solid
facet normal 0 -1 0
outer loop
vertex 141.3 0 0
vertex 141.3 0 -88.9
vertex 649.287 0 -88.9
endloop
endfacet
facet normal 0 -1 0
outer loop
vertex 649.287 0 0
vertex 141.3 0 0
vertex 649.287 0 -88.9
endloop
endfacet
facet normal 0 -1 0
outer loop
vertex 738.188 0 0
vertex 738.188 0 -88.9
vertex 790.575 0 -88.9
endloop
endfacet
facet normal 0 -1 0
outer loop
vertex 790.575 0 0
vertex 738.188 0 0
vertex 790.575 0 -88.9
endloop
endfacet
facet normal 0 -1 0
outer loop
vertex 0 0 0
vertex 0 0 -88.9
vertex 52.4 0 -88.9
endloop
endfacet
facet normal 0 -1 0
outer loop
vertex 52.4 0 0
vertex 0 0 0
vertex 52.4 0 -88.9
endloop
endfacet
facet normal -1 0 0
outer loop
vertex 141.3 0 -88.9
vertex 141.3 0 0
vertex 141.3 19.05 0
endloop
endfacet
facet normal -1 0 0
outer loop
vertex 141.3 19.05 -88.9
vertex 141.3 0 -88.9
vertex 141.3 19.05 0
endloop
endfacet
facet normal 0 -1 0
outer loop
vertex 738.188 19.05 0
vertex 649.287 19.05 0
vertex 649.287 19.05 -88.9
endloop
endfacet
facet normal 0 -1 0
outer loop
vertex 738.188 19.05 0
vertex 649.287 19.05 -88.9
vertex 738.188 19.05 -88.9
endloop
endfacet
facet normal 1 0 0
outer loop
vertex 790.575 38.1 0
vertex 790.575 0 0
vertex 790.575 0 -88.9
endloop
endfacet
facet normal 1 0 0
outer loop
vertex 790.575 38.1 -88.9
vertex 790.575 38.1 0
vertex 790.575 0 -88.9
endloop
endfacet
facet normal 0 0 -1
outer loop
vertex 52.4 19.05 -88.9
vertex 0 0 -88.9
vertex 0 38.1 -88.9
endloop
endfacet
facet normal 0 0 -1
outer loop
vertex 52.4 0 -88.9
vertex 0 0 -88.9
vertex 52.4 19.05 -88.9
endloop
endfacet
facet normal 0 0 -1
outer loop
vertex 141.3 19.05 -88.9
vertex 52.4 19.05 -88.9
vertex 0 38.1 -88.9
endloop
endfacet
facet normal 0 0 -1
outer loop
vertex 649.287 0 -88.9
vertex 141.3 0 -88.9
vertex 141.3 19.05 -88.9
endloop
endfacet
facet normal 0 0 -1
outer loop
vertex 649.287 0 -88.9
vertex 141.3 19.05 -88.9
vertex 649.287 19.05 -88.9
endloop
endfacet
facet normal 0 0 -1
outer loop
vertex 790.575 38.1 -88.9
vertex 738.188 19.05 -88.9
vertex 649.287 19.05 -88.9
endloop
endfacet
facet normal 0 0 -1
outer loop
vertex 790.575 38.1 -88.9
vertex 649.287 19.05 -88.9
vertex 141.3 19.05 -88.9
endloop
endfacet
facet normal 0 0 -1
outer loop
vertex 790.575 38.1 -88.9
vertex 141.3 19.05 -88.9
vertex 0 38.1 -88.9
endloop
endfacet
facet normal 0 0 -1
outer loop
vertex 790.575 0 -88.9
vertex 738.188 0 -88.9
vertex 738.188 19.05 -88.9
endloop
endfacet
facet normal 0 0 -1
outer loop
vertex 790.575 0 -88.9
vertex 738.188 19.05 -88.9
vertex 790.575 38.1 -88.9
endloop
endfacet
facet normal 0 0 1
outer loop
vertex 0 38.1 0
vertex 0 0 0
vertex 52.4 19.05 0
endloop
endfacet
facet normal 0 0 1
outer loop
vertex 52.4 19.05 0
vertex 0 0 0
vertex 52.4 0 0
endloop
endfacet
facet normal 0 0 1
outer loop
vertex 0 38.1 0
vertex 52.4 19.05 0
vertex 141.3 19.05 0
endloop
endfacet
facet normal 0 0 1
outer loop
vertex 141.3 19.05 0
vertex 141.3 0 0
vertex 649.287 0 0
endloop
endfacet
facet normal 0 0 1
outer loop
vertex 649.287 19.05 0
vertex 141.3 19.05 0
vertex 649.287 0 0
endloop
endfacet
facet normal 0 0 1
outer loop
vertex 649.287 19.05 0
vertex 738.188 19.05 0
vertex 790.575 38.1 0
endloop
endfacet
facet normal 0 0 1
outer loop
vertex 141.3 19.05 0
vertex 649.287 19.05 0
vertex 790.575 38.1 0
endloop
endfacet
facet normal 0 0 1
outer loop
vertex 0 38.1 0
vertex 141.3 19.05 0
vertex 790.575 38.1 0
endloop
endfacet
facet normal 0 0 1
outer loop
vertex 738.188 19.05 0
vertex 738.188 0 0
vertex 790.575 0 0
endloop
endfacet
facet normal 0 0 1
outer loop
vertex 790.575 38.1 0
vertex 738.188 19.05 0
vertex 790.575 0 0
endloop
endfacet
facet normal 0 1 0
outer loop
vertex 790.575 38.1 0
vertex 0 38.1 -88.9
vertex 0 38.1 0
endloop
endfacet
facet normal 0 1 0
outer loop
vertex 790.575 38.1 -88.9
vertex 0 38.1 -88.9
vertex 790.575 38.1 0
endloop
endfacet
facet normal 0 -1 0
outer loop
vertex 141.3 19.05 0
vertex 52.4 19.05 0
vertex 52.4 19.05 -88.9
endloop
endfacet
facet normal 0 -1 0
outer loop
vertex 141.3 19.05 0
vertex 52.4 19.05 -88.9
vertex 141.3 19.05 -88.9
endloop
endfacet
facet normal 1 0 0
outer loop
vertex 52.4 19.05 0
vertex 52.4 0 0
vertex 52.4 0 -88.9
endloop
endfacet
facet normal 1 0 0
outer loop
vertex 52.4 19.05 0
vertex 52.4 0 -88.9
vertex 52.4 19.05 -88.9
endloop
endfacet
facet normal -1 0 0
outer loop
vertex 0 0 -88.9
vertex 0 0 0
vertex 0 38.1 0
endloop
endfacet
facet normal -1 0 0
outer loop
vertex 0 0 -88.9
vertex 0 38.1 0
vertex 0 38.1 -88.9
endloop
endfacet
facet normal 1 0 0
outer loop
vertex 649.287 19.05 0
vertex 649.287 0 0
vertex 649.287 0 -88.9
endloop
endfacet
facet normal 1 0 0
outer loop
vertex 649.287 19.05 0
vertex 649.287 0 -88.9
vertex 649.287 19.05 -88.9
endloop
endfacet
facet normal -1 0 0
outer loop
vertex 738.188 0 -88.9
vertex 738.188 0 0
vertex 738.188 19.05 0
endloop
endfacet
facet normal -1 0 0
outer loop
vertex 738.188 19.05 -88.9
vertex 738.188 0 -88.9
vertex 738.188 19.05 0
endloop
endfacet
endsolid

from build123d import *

# Parameters (mm, degrees)
SKETCH1_W           = 790.575
SKETCH1_H           = 88.9
BOSS_EXTRUDE1_DEPTH = 38.1
SKETCH2_W           = 88.9
SKETCH2_H           = 19.05
CUT_EXTRUDE1_DEPTH  = 89.9


with BuildPart() as part:
    # Sketch1 → Boss-Extrude1 (new body)
    with BuildSketch(Plane(origin=(0, 0, 0), x_dir=(1, 0, 0), z_dir=(0, 1, 0))):
        with Locations((395.2875, 44.45)):
            Rectangle(SKETCH1_W, SKETCH1_H)
    extrude(amount=BOSS_EXTRUDE1_DEPTH)

    # Sketch2 → Cut-Extrude1 (cut, through all)
    with BuildSketch(Plane.XY):
        with Locations((693.7375, 9.525)):
            Rectangle(SKETCH2_W, SKETCH2_H)
        with Locations((96.8502, 9.525)):
            Rectangle(SKETCH2_W, SKETCH2_H)
    extrude(amount=-CUT_EXTRUDE1_DEPTH, mode=Mode.SUBTRACT)


solid = part.part
